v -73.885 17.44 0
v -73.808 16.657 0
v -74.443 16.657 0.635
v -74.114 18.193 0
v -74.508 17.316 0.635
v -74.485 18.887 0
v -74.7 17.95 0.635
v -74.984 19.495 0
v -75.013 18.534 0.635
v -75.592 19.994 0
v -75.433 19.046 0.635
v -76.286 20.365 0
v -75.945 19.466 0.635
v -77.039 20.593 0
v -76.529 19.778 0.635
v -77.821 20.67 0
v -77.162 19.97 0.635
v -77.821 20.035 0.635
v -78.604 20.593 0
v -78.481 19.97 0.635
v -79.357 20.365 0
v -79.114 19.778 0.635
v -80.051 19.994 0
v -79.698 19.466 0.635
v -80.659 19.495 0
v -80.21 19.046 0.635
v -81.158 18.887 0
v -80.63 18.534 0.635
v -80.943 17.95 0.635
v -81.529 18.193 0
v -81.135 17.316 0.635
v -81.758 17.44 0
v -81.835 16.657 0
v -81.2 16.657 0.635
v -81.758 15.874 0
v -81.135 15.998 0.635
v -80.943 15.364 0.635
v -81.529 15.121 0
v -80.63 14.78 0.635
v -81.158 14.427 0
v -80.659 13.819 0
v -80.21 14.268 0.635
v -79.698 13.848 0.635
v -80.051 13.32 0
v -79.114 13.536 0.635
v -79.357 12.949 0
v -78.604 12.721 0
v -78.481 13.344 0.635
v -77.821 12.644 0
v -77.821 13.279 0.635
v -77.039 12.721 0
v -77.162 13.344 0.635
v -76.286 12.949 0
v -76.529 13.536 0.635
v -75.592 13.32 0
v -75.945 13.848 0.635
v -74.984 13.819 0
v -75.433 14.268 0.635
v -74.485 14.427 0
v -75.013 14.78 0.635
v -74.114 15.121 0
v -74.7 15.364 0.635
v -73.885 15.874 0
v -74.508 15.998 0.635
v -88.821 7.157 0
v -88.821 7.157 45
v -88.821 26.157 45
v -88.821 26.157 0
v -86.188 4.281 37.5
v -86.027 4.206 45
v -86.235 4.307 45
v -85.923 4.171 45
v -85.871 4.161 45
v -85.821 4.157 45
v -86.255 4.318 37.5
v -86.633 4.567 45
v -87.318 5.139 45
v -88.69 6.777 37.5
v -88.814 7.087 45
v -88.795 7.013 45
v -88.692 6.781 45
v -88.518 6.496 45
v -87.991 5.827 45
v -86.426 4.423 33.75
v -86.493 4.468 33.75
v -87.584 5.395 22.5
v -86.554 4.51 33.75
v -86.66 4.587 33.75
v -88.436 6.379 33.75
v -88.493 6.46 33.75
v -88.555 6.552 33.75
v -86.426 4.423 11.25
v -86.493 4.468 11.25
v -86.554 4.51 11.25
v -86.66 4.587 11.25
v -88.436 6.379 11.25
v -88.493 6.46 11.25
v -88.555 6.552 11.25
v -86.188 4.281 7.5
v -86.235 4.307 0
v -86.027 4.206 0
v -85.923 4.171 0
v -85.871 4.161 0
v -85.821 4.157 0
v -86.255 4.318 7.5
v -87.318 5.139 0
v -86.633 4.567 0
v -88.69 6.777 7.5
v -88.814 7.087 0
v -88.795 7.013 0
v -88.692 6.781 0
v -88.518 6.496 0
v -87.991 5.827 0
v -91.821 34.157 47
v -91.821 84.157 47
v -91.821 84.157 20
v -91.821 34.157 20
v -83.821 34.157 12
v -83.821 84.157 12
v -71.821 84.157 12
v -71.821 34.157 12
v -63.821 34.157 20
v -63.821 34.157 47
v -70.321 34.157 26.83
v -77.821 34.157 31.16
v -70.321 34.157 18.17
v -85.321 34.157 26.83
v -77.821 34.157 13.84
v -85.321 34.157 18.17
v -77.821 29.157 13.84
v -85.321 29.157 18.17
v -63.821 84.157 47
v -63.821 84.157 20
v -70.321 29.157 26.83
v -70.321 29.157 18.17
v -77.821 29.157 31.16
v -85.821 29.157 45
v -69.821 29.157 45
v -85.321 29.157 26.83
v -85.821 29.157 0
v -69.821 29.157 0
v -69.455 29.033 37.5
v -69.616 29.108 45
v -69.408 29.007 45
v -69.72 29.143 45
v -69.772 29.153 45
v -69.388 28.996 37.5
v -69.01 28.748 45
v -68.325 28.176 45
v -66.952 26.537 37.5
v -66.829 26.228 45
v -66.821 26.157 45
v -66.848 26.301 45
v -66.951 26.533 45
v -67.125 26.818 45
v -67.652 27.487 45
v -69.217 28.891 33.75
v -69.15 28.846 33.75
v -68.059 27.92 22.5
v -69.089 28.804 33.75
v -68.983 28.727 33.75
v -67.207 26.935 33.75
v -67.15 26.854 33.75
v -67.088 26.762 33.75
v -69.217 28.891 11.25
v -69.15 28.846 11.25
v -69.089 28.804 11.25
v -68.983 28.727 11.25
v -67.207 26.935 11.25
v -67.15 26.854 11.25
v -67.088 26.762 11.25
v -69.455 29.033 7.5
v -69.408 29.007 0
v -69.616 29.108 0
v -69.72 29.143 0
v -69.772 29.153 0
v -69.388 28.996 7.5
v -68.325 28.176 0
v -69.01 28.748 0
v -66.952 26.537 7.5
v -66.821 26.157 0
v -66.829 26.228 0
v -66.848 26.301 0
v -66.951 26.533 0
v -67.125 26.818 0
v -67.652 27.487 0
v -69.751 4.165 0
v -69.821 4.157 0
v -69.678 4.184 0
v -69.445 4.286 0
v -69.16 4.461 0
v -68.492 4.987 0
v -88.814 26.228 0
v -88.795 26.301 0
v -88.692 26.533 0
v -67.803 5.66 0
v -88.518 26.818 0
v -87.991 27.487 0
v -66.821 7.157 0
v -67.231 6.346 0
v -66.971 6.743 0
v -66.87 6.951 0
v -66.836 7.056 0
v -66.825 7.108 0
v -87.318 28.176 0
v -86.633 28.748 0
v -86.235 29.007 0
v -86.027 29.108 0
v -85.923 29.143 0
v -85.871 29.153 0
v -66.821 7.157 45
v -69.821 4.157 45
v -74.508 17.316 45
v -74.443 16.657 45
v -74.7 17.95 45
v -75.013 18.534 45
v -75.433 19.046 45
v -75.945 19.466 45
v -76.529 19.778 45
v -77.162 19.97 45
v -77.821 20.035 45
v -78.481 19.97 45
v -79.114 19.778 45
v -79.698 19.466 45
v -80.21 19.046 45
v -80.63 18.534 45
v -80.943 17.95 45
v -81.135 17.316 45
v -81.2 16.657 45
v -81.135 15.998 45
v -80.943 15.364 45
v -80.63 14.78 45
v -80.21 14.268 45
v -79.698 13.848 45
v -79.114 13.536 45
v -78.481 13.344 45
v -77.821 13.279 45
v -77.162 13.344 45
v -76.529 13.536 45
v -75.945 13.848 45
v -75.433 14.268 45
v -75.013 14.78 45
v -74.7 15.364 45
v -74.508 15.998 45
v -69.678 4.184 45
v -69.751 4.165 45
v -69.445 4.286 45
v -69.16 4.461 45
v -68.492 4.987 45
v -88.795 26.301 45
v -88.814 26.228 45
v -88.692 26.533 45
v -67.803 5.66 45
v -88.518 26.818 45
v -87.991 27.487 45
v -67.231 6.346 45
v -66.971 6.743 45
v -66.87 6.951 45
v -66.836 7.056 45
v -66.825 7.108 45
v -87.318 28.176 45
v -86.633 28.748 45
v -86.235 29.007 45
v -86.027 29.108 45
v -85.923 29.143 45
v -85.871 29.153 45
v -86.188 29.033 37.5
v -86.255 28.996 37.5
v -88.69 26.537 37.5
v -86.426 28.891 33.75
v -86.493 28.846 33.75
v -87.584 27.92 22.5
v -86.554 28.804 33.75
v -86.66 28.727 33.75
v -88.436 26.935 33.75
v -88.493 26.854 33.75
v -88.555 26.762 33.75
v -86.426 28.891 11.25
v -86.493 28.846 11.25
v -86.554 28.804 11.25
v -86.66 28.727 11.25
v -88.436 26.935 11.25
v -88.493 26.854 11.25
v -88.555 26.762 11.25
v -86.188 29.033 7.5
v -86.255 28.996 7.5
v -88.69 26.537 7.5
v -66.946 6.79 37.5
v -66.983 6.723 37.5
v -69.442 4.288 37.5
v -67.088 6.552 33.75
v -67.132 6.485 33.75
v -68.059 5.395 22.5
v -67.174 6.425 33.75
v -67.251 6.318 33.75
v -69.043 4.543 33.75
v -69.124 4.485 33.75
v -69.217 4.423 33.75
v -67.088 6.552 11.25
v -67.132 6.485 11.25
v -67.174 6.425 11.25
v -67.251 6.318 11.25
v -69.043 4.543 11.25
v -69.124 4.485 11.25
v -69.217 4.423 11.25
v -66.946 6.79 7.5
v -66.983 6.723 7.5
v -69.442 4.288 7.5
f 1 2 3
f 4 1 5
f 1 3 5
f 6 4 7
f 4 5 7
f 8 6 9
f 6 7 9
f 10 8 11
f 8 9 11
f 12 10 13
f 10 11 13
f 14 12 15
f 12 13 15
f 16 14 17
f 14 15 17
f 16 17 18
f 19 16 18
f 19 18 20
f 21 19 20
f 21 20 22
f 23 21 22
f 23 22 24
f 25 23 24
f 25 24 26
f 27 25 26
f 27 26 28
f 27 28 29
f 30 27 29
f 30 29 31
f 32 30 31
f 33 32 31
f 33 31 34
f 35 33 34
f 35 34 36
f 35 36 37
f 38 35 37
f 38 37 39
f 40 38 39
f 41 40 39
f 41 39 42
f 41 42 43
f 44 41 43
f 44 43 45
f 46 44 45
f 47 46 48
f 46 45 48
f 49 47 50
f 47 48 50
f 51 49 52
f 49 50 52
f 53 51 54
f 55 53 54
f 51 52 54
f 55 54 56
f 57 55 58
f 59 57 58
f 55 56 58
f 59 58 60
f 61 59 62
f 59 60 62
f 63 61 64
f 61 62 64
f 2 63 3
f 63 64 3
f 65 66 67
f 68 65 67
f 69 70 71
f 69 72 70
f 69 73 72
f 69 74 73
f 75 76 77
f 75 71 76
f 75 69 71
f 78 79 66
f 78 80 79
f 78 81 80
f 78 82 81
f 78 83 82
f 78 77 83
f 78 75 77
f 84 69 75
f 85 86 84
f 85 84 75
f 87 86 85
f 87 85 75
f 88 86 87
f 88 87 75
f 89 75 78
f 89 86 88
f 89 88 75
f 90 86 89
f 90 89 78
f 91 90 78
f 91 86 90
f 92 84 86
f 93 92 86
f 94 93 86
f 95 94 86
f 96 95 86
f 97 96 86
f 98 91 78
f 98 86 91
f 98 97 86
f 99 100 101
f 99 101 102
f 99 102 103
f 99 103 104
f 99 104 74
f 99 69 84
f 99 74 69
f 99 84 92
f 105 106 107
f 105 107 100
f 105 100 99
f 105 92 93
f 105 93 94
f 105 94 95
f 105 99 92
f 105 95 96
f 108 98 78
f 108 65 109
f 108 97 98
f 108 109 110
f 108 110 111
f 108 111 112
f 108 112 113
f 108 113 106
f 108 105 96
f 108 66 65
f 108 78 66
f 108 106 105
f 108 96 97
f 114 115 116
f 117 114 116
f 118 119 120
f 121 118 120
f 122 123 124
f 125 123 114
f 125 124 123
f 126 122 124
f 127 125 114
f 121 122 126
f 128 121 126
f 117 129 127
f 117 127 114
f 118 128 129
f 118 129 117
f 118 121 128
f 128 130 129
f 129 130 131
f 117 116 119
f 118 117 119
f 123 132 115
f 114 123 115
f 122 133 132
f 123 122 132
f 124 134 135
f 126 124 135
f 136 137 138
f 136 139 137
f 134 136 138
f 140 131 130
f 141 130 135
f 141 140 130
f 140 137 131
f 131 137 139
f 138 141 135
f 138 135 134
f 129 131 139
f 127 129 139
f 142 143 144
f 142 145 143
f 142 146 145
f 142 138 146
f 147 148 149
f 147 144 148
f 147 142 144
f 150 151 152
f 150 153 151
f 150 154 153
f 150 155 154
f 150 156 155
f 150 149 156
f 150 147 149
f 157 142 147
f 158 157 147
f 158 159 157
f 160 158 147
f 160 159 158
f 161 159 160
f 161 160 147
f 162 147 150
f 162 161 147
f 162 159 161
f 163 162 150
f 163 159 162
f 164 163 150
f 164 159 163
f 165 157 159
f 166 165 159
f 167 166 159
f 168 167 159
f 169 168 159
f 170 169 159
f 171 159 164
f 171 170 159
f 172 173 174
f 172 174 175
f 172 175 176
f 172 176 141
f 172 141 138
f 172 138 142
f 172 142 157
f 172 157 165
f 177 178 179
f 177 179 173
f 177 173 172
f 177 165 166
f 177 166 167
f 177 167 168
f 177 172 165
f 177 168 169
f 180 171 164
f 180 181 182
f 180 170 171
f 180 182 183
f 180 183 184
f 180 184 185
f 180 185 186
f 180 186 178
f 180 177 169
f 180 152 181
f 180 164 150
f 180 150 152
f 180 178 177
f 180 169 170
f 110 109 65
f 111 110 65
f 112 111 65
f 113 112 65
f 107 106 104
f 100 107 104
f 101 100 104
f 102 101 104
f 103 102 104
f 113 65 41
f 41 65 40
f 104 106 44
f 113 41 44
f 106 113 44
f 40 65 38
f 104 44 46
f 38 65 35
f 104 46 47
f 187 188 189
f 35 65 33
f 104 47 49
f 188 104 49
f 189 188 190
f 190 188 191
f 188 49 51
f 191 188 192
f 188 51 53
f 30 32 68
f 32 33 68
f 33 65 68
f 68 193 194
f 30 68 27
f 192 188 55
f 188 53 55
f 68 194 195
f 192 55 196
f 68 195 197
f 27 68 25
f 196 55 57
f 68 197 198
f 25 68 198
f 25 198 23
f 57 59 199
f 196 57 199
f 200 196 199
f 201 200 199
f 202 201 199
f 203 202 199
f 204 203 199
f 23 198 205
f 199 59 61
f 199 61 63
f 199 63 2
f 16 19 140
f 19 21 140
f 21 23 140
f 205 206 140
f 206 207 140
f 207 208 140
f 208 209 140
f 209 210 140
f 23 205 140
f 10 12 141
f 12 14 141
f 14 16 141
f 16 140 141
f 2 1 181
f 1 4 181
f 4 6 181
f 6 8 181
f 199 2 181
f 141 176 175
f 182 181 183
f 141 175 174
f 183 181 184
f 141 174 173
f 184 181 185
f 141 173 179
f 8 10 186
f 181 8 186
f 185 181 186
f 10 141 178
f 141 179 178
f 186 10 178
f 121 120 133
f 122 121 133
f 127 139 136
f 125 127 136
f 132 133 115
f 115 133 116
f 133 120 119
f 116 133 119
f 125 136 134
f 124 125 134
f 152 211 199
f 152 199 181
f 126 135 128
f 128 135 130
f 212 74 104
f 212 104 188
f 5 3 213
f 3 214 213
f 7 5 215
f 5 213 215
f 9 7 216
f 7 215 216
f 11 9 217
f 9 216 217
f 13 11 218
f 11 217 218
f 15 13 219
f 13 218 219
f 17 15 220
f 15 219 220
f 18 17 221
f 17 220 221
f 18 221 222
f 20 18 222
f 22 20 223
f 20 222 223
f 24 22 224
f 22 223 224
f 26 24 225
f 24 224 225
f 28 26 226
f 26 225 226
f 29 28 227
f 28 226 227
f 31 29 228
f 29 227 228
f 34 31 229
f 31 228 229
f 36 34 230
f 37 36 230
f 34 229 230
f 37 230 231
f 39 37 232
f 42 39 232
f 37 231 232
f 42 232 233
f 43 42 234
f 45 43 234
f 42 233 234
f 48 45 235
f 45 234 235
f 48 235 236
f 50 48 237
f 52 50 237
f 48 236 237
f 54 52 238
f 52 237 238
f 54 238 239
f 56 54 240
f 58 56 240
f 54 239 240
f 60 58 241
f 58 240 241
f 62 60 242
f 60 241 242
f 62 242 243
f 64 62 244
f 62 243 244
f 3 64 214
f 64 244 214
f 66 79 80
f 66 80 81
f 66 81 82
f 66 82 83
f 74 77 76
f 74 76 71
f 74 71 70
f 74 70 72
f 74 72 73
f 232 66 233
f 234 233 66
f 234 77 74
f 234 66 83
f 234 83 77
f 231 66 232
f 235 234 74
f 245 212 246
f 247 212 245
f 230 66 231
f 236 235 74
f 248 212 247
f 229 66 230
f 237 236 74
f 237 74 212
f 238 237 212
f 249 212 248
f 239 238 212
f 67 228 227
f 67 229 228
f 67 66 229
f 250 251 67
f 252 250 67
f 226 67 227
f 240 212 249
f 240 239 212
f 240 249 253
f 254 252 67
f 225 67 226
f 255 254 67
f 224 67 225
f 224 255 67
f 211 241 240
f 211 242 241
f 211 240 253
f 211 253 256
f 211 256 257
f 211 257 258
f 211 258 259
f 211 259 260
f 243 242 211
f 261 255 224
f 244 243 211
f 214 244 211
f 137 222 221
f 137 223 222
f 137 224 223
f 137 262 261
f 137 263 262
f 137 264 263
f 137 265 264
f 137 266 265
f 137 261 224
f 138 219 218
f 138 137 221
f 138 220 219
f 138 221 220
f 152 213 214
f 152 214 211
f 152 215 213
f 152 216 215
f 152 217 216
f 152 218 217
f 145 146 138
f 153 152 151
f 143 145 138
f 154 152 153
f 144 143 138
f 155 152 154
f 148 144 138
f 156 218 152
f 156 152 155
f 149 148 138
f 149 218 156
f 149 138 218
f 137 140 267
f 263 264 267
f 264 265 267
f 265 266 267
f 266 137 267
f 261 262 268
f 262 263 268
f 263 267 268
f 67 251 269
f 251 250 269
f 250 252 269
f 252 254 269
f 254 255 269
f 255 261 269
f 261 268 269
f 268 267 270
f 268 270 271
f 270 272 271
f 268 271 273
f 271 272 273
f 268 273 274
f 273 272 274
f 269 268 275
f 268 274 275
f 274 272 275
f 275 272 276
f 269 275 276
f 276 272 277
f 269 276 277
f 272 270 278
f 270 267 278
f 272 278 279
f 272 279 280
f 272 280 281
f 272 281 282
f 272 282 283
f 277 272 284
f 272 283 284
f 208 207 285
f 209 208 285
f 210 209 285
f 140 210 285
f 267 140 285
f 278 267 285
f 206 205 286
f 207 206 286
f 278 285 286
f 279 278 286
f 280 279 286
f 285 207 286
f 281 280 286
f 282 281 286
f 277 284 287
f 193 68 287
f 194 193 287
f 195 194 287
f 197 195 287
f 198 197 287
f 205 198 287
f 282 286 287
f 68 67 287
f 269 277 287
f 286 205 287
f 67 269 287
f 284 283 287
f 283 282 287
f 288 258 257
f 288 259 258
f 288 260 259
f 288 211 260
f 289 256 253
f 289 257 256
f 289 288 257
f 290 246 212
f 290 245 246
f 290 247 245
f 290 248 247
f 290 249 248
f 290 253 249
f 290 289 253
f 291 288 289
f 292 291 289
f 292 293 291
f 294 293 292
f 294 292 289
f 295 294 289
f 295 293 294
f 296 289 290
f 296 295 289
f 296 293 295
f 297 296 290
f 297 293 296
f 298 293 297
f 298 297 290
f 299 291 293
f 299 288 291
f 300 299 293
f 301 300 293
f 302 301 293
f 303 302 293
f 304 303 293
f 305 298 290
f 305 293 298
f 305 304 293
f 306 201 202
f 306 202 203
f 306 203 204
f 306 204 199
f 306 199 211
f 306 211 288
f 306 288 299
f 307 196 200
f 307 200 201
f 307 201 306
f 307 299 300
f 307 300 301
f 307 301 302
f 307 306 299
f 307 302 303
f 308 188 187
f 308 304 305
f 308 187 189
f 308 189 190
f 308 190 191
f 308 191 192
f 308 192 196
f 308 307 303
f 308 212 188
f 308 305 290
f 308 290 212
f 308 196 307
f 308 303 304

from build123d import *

# Parameters (mm, degrees)
ESQUISSE1_W                 = 22
ESQUISSE1_H                 = 25
BOSS_EXTRU_1_DEPTH          = 45
BOSS_EXTRU_2_DEPTH          = 5
BOSS_EXTRU_3_DEPTH          = 50
D_GAGEMENT_1_41_D           = 6.7564
D_GAGEMENT_1_41_CSINK_D     = 8.0264
D_GAGEMENT_1_41_CSINK_ANGLE = 90
CONG_1_SIZE                 = 3


with BuildPart() as part:
    # Esquisse1 → Boss.-Extru.1 (new body)
    with BuildSketch(Plane.XY):
        with Locations((-77.82148747, 16.657061647)):
            Rectangle(ESQUISSE1_W, ESQUISSE1_H)
    extrude(amount=BOSS_EXTRU_1_DEPTH)

    # Esquisse2 → Boss.-Extru.2 (add)
    with BuildSketch(Plane(origin=(0, 29.157061647, 0), x_dir=(1, 0, 0), z_dir=(0, 1, 0))):
        Polygon((-85.32148747, -18.169872981), (-85.32148747, -26.830127019), (-77.82148747, -31.160254038), (-70.32148747, -26.830127019), (-70.32148747, -18.169872981), (-77.82148747, -13.839745962), align=None)
    extrude(amount=BOSS_EXTRU_2_DEPTH)

    # Esquisse4 → Boss.-Extru.3 (add)
    # profile 1 of 2: a face of its own
    with BuildSketch(Plane(origin=(0, 34.157061647, 0), x_dir=(1, 0, 0), z_dir=(0, 1, 0))):
        Polygon((-71.82148747, -12), (-63.82148747, -20), (-63.82148747, -47), (-91.82148747, -47), (-91.82148747, -20), (-83.82148747, -12), align=None)
        Polygon((-77.82148747, -13.839745962), (-85.32148747, -18.169872981), (-85.32148747, -26.830127019), (-77.82148747, -31.160254038), (-70.32148747, -26.830127019), (-70.32148747, -18.169872981), align=None, mode=Mode.SUBTRACT)
    # profile 2 of 2: a face of its own
    with BuildSketch(Plane(origin=(0, 34.157061647, 0), x_dir=(1, 0, 0), z_dir=(0, 1, 0))):
        Polygon((-70.32148747, -18.169872981), (-77.82148747, -13.839745962), (-85.32148747, -18.169872981), (-85.32148747, -26.830127019), (-77.82148747, -31.160254038), (-70.32148747, -26.830127019), align=None)
    extrude(amount=BOSS_EXTRU_3_DEPTH)

    # Dégagement 1/41 (through all)
    with Locations(Plane(origin=(0, 0, 0), x_dir=(-1, 0, 0), z_dir=(0, 0, -1))):
        with Locations((77.82148747, 16.657061647)):
            CounterSinkHole(D_GAGEMENT_1_41_D / 2, D_GAGEMENT_1_41_CSINK_D / 2, counter_sink_angle=D_GAGEMENT_1_41_CSINK_ANGLE)

    # Congé1
    # a fillet whose section is not a circle: 3 mm, written as the material it takes off along each edge
    with BuildSketch(Plane(origin=(-88.82148747, 4.157061647, -7.5), x_dir=(1, 0, 0), z_dir=(0, 0, 1)), Plane(origin=(-66.82148747, 29.157061647, -7.5), x_dir=(-1, 0, 0), z_dir=(0, 0, 1)), Plane(origin=(-66.82148747, 4.157061647, -7.5), x_dir=(0, 1, 0), z_dir=(0, 0, 1))) as cong_1_piece_1:
        with BuildLine():
            Bezier((CONG_1_SIZE, 0), (0, 0), (0, CONG_1_SIZE), weights=[1, 0.212132034, 1])
            Line((0, CONG_1_SIZE), (0, 0))
            Line((0, 0), (CONG_1_SIZE, 0))
        make_face()
    extrude(amount=60, mode=Mode.SUBTRACT)
    with BuildSketch(Plane(origin=(-88.82148747, 29.157061647, -7.5), x_dir=(1, 0, 0), z_dir=(0, 0, 1))) as cong_1_piece_2:
        with BuildLine():
            Bezier((CONG_1_SIZE, 0), (0, 0), (0, -CONG_1_SIZE), weights=[1, 0.212132034, 1])
            Line((0, -CONG_1_SIZE), (0, 0))
            Line((0, 0), (CONG_1_SIZE, 0))
        make_face()
    extrude(amount=60, mode=Mode.SUBTRACT)


solid = part.part
